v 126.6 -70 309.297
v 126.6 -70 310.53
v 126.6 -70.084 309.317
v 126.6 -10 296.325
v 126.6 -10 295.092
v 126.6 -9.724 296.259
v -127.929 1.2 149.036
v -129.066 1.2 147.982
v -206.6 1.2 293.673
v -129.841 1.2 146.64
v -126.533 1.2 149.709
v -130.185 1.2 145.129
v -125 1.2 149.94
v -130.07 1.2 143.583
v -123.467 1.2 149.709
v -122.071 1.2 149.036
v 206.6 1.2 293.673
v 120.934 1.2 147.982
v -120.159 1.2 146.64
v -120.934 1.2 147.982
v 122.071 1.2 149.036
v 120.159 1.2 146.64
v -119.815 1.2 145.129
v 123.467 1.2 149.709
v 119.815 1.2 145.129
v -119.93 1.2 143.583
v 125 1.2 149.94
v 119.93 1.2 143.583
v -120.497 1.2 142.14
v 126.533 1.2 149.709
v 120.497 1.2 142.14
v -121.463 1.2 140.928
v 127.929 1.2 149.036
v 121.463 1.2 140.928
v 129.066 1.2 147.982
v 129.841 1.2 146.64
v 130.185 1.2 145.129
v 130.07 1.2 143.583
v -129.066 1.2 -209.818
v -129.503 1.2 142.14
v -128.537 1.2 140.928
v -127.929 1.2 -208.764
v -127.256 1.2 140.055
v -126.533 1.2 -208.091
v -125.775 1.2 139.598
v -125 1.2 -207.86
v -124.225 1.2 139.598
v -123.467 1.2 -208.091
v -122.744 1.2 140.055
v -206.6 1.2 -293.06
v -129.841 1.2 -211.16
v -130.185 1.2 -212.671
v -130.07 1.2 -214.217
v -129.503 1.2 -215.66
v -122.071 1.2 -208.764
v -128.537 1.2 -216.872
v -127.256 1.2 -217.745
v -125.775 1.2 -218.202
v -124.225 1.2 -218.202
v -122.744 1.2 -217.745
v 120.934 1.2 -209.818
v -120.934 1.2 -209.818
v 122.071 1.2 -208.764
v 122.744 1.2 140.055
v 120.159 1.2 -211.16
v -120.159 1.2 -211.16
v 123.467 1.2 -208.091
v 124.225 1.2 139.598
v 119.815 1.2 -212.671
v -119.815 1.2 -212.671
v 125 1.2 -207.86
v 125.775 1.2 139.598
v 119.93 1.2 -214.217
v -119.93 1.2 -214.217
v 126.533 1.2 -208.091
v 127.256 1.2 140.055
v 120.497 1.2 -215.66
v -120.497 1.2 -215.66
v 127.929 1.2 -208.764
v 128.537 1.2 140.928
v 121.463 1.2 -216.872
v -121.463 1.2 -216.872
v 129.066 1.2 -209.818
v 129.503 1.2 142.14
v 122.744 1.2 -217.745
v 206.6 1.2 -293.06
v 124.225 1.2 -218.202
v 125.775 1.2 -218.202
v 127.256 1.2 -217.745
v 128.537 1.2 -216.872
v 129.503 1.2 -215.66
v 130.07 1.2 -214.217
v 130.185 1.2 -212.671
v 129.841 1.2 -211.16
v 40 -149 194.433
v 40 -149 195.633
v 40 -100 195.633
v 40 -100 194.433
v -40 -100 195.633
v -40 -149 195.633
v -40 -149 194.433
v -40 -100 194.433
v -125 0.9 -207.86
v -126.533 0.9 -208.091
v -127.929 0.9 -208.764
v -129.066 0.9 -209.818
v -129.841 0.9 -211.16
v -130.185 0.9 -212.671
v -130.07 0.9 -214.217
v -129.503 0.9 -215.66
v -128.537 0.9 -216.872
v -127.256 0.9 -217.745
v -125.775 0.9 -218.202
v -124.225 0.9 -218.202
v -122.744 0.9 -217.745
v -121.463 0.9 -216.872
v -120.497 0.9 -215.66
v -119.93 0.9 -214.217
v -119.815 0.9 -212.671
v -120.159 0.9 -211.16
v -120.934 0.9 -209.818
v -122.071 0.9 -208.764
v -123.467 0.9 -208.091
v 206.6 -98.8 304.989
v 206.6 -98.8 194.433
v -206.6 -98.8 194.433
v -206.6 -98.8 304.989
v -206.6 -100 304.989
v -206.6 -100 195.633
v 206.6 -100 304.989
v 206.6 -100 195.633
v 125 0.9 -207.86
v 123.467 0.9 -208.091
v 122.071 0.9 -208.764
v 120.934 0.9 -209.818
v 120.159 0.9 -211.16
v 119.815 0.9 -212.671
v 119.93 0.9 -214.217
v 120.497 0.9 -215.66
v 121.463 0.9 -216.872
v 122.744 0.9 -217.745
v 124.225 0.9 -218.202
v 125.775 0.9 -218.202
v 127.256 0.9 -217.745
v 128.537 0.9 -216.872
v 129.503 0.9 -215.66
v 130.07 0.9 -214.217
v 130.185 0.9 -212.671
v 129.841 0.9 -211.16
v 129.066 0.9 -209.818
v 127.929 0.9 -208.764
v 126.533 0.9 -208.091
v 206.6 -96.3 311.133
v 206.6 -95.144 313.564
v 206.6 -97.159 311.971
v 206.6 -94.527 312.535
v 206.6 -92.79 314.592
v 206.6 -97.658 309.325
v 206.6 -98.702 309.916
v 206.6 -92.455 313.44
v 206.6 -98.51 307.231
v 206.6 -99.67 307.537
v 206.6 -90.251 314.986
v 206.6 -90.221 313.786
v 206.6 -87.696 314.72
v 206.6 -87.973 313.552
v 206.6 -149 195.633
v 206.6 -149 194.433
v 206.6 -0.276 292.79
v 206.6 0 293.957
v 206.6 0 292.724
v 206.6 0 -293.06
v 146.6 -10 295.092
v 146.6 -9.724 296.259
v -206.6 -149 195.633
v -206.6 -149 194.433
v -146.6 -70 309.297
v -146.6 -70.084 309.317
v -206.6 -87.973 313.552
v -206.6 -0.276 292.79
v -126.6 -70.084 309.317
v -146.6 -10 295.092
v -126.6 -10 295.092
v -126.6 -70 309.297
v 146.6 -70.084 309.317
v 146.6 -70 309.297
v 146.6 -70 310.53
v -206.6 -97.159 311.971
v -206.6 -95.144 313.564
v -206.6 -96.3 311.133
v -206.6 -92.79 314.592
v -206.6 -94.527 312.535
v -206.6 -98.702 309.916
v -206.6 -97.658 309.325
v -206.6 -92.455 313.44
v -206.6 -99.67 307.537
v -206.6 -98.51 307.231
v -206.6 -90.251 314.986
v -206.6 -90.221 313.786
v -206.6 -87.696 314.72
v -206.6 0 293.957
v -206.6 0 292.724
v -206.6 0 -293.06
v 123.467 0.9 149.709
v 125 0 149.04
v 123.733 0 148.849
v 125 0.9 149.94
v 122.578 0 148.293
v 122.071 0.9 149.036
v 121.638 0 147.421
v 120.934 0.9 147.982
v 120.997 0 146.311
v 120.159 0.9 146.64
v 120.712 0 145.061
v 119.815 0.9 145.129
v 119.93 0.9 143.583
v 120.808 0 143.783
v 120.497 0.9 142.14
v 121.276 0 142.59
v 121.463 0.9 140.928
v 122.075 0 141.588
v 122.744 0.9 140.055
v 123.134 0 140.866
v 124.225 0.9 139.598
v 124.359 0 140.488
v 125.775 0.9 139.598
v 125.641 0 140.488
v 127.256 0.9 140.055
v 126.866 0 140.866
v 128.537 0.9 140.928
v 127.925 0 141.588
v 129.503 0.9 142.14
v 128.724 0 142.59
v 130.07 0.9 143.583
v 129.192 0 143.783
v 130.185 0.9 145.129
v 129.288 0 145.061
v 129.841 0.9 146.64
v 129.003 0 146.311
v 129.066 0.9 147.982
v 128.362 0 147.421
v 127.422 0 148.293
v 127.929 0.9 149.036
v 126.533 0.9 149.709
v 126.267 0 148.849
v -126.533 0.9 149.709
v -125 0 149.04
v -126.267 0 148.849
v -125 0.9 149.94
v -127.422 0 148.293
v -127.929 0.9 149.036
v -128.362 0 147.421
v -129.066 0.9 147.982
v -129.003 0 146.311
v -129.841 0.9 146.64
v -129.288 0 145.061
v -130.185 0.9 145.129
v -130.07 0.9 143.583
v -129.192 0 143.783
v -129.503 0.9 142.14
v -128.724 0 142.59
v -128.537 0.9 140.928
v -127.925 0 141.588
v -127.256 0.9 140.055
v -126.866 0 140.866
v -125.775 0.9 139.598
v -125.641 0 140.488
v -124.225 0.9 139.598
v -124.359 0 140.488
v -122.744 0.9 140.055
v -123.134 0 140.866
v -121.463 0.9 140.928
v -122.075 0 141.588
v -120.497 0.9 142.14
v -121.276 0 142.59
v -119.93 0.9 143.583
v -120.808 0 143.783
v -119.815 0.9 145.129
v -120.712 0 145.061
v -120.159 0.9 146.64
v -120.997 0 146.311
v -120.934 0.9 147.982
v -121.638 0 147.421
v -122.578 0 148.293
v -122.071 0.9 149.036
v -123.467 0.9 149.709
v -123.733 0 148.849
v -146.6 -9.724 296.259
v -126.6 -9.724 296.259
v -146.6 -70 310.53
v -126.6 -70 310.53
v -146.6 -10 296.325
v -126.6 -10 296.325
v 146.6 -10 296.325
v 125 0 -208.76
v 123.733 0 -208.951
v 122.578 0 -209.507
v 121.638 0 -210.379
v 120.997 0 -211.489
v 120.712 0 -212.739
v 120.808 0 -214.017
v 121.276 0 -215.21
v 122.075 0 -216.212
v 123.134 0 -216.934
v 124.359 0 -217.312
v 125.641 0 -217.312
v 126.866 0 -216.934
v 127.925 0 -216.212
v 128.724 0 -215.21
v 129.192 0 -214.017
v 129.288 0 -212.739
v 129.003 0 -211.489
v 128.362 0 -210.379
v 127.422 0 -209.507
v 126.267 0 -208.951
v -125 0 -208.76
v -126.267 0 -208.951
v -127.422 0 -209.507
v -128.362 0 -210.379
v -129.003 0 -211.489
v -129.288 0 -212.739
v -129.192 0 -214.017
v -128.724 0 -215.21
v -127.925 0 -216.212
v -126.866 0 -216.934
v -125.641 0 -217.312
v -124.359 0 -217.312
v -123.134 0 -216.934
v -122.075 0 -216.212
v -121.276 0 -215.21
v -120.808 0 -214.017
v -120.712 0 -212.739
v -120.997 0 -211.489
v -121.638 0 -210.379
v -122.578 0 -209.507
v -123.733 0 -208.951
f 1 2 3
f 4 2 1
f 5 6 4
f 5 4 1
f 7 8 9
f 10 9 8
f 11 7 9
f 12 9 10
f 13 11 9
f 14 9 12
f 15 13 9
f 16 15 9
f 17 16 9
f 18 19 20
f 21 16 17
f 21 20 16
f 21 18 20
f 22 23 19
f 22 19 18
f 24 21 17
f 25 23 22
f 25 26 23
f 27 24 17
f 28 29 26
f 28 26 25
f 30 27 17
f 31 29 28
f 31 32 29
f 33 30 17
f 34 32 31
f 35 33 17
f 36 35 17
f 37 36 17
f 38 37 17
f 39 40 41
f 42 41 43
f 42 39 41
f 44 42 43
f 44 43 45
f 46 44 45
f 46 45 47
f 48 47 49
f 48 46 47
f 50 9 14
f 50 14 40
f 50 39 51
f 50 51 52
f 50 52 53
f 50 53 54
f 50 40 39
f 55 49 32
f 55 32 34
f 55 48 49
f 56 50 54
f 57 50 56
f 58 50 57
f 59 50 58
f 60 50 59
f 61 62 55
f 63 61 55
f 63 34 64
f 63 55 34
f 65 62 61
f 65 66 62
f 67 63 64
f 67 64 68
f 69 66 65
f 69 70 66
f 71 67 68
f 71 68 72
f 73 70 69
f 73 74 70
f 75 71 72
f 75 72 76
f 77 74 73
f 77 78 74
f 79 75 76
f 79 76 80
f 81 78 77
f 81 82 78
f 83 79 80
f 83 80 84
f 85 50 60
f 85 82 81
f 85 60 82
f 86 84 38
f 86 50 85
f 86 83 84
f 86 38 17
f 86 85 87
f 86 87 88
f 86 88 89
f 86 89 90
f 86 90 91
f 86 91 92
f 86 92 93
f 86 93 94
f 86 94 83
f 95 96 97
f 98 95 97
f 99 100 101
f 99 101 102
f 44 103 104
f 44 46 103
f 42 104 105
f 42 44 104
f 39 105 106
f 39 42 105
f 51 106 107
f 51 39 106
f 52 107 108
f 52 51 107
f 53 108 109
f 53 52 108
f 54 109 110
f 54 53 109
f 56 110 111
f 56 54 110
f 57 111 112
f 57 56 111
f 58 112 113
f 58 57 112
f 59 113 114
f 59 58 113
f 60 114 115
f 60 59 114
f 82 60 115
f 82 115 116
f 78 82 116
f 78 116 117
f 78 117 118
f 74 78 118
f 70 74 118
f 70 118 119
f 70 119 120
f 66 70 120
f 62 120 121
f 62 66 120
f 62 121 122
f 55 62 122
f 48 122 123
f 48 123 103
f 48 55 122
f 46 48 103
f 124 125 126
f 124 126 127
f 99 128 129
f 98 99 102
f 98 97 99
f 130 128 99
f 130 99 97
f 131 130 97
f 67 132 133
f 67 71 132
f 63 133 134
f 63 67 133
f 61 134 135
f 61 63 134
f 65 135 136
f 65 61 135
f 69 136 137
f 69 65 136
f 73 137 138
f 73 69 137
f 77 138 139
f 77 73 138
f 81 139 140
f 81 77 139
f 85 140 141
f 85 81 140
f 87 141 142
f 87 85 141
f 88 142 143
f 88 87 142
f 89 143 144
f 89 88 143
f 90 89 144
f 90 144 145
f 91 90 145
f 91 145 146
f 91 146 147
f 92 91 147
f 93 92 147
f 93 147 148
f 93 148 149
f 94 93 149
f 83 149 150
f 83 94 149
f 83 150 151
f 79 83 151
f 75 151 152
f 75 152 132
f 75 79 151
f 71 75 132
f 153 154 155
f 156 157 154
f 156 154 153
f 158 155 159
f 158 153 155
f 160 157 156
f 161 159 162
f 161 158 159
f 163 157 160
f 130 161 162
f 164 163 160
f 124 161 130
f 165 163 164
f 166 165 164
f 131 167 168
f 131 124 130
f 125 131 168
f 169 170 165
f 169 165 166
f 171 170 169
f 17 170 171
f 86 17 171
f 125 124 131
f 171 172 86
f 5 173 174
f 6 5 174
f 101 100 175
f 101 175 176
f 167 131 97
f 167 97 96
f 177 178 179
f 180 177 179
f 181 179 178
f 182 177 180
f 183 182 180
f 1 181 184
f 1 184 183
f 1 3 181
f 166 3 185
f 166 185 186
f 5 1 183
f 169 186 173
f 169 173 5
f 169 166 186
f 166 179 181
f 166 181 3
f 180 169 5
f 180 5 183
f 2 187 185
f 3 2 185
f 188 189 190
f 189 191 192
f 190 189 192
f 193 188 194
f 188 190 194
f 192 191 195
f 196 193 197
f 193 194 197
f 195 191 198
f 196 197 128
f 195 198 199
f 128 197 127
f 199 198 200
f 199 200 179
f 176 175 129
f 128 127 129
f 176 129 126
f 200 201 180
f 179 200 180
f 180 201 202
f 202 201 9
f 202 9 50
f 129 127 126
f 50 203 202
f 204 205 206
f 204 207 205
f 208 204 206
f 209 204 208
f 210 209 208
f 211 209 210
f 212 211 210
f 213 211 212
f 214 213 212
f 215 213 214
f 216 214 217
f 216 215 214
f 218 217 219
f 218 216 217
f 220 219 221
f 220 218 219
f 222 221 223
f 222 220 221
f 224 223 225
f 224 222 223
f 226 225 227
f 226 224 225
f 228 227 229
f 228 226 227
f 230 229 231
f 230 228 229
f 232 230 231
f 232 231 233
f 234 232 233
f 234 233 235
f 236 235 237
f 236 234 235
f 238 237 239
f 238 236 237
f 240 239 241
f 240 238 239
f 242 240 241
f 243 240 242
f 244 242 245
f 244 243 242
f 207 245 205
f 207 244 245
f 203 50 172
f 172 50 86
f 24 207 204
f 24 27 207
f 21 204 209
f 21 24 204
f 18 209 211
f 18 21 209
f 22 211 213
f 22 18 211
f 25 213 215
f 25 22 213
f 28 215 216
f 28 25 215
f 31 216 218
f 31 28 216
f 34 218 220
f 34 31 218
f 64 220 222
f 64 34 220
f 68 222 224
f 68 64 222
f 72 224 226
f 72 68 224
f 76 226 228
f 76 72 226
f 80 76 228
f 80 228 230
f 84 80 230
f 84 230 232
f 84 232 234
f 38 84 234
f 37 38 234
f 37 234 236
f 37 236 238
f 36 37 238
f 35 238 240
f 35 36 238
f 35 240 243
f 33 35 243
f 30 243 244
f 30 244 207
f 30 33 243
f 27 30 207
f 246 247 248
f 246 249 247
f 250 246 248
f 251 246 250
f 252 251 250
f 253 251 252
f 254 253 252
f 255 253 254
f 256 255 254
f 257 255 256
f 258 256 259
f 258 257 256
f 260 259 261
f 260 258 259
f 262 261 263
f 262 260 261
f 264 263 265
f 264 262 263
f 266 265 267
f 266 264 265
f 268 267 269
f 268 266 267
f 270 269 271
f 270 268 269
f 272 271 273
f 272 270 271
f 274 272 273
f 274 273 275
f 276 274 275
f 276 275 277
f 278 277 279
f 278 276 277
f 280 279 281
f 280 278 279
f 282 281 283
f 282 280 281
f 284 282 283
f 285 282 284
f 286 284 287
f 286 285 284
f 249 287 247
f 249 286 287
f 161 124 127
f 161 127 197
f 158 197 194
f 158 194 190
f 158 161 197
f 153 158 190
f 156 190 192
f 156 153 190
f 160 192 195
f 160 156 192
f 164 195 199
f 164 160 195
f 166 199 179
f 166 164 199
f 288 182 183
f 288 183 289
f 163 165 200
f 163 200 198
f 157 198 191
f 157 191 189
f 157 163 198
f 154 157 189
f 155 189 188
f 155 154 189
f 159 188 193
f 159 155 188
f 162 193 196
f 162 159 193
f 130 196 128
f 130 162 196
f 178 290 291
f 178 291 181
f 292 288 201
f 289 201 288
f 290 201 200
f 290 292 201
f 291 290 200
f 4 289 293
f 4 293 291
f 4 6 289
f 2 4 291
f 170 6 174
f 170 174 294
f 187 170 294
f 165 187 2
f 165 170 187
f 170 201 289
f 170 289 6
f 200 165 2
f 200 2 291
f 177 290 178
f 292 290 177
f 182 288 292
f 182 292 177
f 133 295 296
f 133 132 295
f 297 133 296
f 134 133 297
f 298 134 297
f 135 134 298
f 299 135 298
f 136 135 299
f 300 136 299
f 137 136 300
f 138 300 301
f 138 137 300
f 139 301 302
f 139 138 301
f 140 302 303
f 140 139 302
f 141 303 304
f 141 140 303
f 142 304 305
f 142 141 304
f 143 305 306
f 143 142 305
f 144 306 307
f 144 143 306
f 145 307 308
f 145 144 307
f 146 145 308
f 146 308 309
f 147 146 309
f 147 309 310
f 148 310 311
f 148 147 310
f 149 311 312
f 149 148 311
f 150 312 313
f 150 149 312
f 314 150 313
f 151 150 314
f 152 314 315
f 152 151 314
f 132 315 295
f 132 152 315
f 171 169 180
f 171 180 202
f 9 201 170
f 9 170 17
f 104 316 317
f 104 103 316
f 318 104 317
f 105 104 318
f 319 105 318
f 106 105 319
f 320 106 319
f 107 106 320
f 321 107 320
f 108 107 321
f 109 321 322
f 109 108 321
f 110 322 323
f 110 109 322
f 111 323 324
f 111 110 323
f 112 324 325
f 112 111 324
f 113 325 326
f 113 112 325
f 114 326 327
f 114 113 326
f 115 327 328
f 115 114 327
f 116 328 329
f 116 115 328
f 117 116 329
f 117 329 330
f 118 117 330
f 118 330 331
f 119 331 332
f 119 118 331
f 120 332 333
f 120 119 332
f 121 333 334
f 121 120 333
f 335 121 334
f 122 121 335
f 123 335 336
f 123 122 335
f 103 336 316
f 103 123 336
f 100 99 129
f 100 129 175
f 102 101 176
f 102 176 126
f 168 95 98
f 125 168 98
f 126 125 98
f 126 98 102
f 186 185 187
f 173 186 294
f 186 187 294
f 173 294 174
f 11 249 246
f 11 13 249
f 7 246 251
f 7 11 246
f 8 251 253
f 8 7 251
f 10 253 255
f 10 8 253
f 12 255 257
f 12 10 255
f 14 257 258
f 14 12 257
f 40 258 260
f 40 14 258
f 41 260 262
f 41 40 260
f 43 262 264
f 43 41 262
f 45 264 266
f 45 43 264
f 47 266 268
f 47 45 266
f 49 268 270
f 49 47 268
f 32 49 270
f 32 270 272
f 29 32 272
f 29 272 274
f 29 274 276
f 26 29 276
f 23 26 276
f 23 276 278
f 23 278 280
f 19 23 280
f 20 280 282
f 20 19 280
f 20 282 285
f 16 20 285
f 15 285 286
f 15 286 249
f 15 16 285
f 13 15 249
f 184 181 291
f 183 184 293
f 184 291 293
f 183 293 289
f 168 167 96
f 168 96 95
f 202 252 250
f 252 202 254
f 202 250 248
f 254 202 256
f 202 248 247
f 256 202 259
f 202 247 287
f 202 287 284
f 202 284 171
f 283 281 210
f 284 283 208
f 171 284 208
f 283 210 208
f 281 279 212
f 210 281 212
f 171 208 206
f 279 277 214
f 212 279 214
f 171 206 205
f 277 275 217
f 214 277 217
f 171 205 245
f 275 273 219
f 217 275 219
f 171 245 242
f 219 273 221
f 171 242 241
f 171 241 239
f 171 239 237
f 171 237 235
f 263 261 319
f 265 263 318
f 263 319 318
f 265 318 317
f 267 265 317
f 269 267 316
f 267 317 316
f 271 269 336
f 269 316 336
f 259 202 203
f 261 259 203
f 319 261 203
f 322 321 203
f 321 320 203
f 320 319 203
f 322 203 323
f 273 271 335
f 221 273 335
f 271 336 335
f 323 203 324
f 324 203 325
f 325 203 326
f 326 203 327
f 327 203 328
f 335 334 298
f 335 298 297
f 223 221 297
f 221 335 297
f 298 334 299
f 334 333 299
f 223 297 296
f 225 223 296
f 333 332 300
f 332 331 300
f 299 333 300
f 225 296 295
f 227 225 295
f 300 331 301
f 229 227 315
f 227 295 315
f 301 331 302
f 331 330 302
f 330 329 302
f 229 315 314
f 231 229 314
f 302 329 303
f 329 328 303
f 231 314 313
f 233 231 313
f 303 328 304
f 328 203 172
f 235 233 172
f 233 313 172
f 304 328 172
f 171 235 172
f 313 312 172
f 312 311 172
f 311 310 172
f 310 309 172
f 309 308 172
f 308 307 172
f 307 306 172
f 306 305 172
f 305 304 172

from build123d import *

# Parameters (mm, degrees)
SKETCH_1_W                  = 413.2
SKETCH_1_H                  = 588.12
EXTRUDE_1_DEPTH             = 1.2
CUT_EXTRUDE_1_DEPTH         = 360.383198828
CUT_EXTRUDE_1_DEPTH_BACK    = 360.383198828
EXTRUDE_3_DEPTH             = 413.2
CUT_EXTRUDE_2_REACH         = 407.539
SKETCH_5_W                  = 413.2
SKETCH_5_H                  = 1
HOLE_WIZARD_M5_1_AT_2_COUNT = 2
HOLE_WIZARD_M5_1_AT_2_PITCH = 250
HOLE_WIZARD_M5_1_AT_3_COUNT = 2
HOLE_WIZARD_M5_1_AT_3_PITCH = 436.48692993
HOLE_WIZARD_M5_1_AT_4_COUNT = 2
HOLE_WIZARD_M5_1_AT_4_PITCH = 357.8
CUT_EXTRUDE_3_REACH         = 553.095
SKETCH_10_W                 = 80
SKETCH_10_H                 = 49
CUT_EXTRUDE_4_REACH         = 665.873
SKETCH_11_W                 = 20
SKETCH_11_H                 = 60
CUT_EXTRUDE_5_DEPTH         = 20


with BuildPart() as part:
    # 스케치1 → 보스-돌출1 (new body)
    with BuildSketch(Plane(origin=(0, 0, 0), x_dir=(1, 0, 0), z_dir=(0, 1, 0))):
        Rectangle(SKETCH_1_W, SKETCH_1_H)
    extrude(amount=EXTRUDE_1_DEPTH)

    # 스케치2 → 컷-돌출1 (cut, two sides: drawn at the far end of the back side and taken through both)
    with BuildSketch(Plane(origin=(0, 0, 0), x_dir=(0, 0, -1), z_dir=(1, 0, 0)).offset(-CUT_EXTRUDE_1_DEPTH_BACK)):
        Polygon((-293.957235481, 0), (-293.673125179, 1.2), (-294.06, 1.2), (-294.06, 0), align=None)
    extrude(amount=CUT_EXTRUDE_1_DEPTH + CUT_EXTRUDE_1_DEPTH_BACK, mode=Mode.SUBTRACT)

    # 스케치4 → 보스-돌출3 (add)
    with BuildSketch(Plane(origin=(206.6, 0, 0), x_dir=(0, 0, -1), z_dir=(1, 0, 0))):
        with BuildLine():
            Line((-293.957235481, 0), (-314.720041398, -87.696105733))
            ThreePointArc((-314.720041398, -87.696105733), (-312.832491208, -96.20326758), (-304.989056289, -100))
            Line((-304.989056289, -100), (-195.633093997, -100))
            Line((-195.633093997, -100), (-195.633093997, -149))
            Line((-195.633093997, -149), (-194.433093997, -149))
            Line((-194.433093997, -149), (-194.433093997, -98.8))
            Line((-194.433093997, -98.8), (-304.989056289, -98.8))
            ThreePointArc((-304.989056289, -98.8), (-311.891279018, -95.45887547), (-313.552323185, -87.972573045))
            Line((-313.552323185, -87.972573045), (-292.789517268, -0.276467312))
            Line((-292.789517268, -0.276467312), (-292.724061259, 0))
            Line((-292.724061259, 0), (-293.957235481, 0))
        make_face()
    extrude(amount=-EXTRUDE_3_DEPTH)

    # 스케치5 → 컷-돌출2 (cut, up to next)
    with BuildSketch(Plane(origin=(0, 1.2, 0), x_dir=(1, 0, 0), z_dir=(0, 1, 0)), mode=Mode.PRIVATE) as cut_extrude_2_sk1:
        with Locations((0, 293.56)):
            Rectangle(SKETCH_5_W, SKETCH_5_H)
    cut_extrude_2_tool1 = extrude(cut_extrude_2_sk1.sketch, amount=-CUT_EXTRUDE_2_REACH, mode=Mode.PRIVATE) & part.part
    add(cut_extrude_2_tool1.solids().sort_by_distance((0, 1.2, -293.56))[0], mode=Mode.SUBTRACT)

    # 스케치8 → M5 접시 머리 나사용 카운터싱크1 (revolve, cut)
    with BuildSketch(Plane(origin=(-125, 1.2, -213.06), x_dir=(0, 0, 1), z_dir=(1, 0, 0))):
        Polygon((0, 0), (0, 1.2), (2.75, 1.2), (2.75, 2.75), (5.2, 0.3), (5.2, 0), align=None)
    hole_wizard_m5_1 = revolve(axis=Axis((-125, 7.55, -213.06), (0, -1, 0)), mode=Mode.SUBTRACT)

    # M5 접시 머리 나사용 카운터싱크1 at 2: M5 접시 머리 나사용 카운터싱크1 ×2
    with Locations(*[(i * HOLE_WIZARD_M5_1_AT_2_PITCH, 0, 0) for i in range(1, HOLE_WIZARD_M5_1_AT_2_COUNT)]):
        add(hole_wizard_m5_1, mode=Mode.SUBTRACT)

    # M5 접시 머리 나사용 카운터싱크1 at 3: M5 접시 머리 나사용 카운터싱크1 ×2
    with Locations(*[Vector(0.5727548360724275, 0, 0.8197267213868575) * (i * HOLE_WIZARD_M5_1_AT_3_PITCH) for i in range(1, HOLE_WIZARD_M5_1_AT_3_COUNT)]):
        add(hole_wizard_m5_1, mode=Mode.SUBTRACT)

    # M5 접시 머리 나사용 카운터싱크1 at 4: M5 접시 머리 나사용 카운터싱크1 ×2
    with Locations(*[(0, 0, i * HOLE_WIZARD_M5_1_AT_4_PITCH) for i in range(1, HOLE_WIZARD_M5_1_AT_4_COUNT)]):
        add(hole_wizard_m5_1, mode=Mode.SUBTRACT)

    # 스케치10 → 컷-돌출3 (cut, up to next)
    with BuildSketch(Plane.XY.offset(195.633093997), mode=Mode.PRIVATE) as cut_extrude_3_sk1:
        with Locations((0, -124.5)):
            Rectangle(SKETCH_10_W, SKETCH_10_H)
    cut_extrude_3_tool1 = extrude(cut_extrude_3_sk1.sketch, amount=-CUT_EXTRUDE_3_REACH, mode=Mode.PRIVATE) & part.part
    add(cut_extrude_3_tool1.solids().sort_by_distance((0, -124.5, 195.633094))[0], mode=Mode.SUBTRACT)

    # 컷-돌출4: up to this plane
    cut_extrude_4_end = Plane(origin=(-206.6, -0.276467312, 292.789517268), z_dir=(0, -0.2303894266765572, -0.9730985109821345))
    # 스케치11 → 컷-돌출4 (cut, up to the surface)
    with BuildSketch(Plane.XY.offset(320), mode=Mode.PRIVATE) as cut_extrude_4_sk1:
        with Locations((-136.6, -40)):
            Rectangle(SKETCH_11_W, SKETCH_11_H)
    cut_extrude_4_tool1 = split(extrude(cut_extrude_4_sk1.sketch, amount=-CUT_EXTRUDE_4_REACH, mode=Mode.PRIVATE), bisect_by=cut_extrude_4_end, keep=Keep.BOTH, mode=Mode.PRIVATE)
    add(cut_extrude_4_tool1.solids().sort_by_distance((-136.6, -40, 320))[0], mode=Mode.SUBTRACT)
    # 스케치11 → 컷-돌출4 (cut, up to the surface)
    with BuildSketch(Plane.XY.offset(320), mode=Mode.PRIVATE) as cut_extrude_4_sk2:
        with Locations((136.6, -40)):
            Rectangle(SKETCH_11_W, SKETCH_11_H)
    cut_extrude_4_tool2 = split(extrude(cut_extrude_4_sk2.sketch, amount=-CUT_EXTRUDE_4_REACH, mode=Mode.PRIVATE), bisect_by=cut_extrude_4_end, keep=Keep.BOTH, mode=Mode.PRIVATE)
    add(cut_extrude_4_tool2.solids().sort_by_distance((136.6, -40, 320))[0], mode=Mode.SUBTRACT)

    # 스케치12 → 컷-돌출5 (cut)
    with BuildSketch(Plane(origin=(-146.6, 0, 0), x_dir=(0, 0, -1), z_dir=(1, 0, 0))):
        Polygon((-295.09164711, -10), (-296.259365323, -9.723532688), (-296.324821333, -10), (-310.530336442, -70), (-309.316935211, -70.083515414), (-309.297162219, -70), align=None)
    cut_extrude_5 = extrude(amount=CUT_EXTRUDE_5_DEPTH, mode=Mode.SUBTRACT)

    # 대칭 복사2: 컷-돌출5 across plane
    add(cut_extrude_5.mirror(Plane(origin=(0, 0, 0), x_dir=(0, 0, 1), z_dir=(1, 0, 0))), mode=Mode.SUBTRACT)


solid = part.part
